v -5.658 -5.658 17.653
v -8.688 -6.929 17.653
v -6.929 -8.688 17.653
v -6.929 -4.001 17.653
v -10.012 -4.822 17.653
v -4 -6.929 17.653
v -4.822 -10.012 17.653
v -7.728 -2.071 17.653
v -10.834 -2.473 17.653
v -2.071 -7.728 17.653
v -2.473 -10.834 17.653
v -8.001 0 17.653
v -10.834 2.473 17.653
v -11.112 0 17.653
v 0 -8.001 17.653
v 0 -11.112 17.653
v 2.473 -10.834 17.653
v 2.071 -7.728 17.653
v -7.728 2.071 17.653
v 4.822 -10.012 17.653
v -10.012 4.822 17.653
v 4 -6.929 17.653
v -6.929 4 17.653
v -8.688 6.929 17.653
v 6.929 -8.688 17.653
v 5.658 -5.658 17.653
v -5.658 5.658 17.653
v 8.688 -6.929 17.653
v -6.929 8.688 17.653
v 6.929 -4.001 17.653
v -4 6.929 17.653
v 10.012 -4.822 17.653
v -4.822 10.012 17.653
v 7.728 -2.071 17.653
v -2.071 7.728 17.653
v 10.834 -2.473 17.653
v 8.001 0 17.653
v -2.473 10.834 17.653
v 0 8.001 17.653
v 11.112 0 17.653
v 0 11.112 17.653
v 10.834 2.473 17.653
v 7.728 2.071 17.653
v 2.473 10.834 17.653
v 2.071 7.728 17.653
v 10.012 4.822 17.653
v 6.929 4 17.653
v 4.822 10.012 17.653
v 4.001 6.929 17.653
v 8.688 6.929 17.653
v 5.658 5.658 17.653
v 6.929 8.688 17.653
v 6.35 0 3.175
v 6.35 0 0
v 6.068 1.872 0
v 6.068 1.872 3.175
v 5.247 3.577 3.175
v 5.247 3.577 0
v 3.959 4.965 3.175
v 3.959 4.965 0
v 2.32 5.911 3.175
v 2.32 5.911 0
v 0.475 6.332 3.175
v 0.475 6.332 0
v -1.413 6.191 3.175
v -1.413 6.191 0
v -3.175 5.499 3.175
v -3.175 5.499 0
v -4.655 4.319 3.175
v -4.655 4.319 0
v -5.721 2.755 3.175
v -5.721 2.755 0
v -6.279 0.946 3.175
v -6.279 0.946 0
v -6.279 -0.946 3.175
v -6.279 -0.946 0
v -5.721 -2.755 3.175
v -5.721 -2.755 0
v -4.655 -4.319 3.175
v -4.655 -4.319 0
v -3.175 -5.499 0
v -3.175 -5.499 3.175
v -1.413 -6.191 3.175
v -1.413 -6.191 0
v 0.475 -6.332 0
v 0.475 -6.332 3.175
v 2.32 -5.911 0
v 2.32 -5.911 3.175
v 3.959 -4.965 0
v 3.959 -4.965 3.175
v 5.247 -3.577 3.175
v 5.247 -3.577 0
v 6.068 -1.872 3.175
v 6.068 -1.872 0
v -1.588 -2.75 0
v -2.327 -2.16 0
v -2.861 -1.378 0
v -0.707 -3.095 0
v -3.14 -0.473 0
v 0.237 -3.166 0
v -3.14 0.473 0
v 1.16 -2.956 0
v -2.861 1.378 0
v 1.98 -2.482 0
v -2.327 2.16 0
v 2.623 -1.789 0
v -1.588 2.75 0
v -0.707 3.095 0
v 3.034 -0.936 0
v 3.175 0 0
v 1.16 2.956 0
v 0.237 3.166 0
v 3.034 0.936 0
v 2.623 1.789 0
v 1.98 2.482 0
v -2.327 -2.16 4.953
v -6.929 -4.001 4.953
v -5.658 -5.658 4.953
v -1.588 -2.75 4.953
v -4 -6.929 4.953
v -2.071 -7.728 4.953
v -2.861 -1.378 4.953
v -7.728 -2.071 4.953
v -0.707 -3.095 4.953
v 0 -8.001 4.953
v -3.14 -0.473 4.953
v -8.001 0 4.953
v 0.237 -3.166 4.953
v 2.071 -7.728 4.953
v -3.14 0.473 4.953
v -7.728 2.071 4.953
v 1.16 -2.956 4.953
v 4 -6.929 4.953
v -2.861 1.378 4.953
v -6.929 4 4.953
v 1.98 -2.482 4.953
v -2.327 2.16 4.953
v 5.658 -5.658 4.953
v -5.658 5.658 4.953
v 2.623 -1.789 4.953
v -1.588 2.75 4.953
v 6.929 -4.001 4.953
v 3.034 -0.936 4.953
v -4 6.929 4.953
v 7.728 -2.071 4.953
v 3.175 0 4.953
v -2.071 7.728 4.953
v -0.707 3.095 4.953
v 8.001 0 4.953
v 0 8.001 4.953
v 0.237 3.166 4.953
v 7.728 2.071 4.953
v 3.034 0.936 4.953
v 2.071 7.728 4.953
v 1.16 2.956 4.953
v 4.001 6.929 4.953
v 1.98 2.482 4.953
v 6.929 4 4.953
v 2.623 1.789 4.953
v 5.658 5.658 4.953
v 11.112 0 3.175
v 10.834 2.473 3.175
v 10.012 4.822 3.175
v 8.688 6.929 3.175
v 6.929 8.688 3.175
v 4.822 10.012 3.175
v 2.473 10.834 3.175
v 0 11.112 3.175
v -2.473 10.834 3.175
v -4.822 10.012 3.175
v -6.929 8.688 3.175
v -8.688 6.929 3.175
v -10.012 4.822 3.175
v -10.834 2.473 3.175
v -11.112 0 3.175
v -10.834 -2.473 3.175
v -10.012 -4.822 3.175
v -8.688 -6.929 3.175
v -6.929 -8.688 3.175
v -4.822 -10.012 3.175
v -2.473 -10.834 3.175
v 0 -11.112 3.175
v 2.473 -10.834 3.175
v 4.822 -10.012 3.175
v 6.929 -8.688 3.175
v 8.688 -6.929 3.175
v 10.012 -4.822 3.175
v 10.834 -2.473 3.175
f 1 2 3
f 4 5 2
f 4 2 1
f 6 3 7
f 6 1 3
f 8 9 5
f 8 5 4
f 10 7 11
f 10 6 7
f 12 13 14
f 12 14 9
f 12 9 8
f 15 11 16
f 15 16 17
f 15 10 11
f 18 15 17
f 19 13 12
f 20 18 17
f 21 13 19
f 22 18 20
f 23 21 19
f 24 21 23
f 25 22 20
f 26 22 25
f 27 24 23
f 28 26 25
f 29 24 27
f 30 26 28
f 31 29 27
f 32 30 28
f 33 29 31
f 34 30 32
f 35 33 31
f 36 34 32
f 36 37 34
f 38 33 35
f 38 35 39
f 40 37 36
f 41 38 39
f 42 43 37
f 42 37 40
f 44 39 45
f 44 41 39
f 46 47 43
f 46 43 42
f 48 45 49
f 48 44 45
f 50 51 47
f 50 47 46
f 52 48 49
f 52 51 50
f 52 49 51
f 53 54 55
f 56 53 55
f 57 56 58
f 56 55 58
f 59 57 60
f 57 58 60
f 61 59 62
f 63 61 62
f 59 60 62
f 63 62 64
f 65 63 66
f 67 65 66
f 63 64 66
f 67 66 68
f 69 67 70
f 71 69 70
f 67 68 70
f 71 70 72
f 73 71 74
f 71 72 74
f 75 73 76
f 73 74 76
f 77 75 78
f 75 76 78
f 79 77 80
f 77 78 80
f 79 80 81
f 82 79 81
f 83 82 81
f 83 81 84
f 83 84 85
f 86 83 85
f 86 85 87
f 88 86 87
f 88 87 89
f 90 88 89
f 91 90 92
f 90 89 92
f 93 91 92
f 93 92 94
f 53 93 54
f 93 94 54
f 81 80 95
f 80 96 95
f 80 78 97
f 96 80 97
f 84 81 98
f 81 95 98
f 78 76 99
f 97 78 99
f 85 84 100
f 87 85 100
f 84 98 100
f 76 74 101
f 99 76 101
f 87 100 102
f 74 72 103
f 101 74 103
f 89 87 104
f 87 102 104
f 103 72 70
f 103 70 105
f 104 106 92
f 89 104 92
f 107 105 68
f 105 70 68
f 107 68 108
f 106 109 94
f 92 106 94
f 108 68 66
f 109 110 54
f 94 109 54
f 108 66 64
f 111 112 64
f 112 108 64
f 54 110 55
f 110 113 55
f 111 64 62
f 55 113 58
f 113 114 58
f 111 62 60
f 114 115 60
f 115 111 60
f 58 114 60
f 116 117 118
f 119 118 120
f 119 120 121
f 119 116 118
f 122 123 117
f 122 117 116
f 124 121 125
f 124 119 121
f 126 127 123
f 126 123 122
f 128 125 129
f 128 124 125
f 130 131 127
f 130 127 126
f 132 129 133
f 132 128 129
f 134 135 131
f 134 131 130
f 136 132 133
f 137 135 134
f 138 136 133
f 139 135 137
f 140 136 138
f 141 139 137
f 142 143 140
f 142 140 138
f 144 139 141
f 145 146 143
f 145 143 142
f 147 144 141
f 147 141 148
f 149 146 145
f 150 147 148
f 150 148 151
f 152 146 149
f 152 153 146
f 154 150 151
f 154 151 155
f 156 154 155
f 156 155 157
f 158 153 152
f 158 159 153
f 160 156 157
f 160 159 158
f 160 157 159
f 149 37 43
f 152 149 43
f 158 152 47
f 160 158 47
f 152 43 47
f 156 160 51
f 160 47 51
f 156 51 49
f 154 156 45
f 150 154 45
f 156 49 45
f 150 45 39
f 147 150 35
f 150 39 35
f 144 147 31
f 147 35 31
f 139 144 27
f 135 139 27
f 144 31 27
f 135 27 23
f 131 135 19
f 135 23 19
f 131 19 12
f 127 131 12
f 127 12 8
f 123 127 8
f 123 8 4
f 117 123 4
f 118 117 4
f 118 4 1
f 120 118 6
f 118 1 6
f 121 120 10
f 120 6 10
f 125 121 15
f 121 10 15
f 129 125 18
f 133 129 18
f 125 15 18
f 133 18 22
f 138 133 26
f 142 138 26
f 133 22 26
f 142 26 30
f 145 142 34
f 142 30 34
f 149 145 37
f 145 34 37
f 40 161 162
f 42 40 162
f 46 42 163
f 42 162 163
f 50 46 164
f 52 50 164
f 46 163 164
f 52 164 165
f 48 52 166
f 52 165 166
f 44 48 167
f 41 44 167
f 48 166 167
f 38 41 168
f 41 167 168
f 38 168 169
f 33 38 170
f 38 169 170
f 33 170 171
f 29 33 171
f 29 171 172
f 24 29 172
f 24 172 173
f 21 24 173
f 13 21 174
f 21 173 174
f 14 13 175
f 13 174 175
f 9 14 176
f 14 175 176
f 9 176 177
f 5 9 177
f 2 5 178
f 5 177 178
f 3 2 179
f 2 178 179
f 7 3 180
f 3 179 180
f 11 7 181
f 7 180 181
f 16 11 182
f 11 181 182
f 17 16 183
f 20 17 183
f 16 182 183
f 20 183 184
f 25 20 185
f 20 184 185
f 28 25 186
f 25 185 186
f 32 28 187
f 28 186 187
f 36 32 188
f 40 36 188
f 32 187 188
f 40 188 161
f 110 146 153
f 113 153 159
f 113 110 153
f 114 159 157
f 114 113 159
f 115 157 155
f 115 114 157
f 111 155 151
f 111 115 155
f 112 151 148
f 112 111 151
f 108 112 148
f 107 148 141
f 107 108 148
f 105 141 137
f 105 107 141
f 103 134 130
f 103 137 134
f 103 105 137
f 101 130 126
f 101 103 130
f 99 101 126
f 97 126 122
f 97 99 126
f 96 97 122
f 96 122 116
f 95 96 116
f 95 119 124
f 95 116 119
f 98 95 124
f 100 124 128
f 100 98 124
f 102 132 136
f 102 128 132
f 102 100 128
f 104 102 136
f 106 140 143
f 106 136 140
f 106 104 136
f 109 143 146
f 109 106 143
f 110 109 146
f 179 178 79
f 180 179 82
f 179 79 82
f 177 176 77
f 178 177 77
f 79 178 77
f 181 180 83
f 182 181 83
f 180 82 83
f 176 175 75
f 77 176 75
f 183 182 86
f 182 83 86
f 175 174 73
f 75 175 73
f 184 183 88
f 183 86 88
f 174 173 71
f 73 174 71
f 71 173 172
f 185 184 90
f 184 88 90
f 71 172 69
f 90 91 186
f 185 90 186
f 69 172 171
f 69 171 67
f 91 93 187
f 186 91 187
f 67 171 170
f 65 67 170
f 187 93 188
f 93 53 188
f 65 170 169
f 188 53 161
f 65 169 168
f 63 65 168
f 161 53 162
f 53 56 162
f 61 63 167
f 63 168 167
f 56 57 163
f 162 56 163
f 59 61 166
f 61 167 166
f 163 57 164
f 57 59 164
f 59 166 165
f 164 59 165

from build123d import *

# Parameters (mm, degrees)
F0_R     = 6.35
F0_R_2   = 3.175
F1_DEPTH = 3.175
F2_R     = 11.1125
F2_R_2   = 3.175
F3_DEPTH = 14.478
F4_R     = 8.001
F5_DEPTH = 12.7


with BuildPart() as f1:
    # F0 (on Top) → F1 (new body)
    with BuildSketch(Plane.XY):
        Circle(F0_R)
        Circle(F0_R_2, mode=Mode.SUBTRACT)
    extrude(amount=F1_DEPTH)

    # F2 (on face) → F3 (join)
    with BuildSketch(Plane.XY.offset(3.175)):
        Circle(F2_R)
        Circle(F2_R_2, mode=Mode.SUBTRACT)
    extrude(amount=F3_DEPTH)

    # F4 (on face) → F5 (cut)
    with BuildSketch(Plane.XY.offset(17.653)):
        Circle(F4_R)
    extrude(amount=-F5_DEPTH, mode=Mode.SUBTRACT)


solid = f1.part
